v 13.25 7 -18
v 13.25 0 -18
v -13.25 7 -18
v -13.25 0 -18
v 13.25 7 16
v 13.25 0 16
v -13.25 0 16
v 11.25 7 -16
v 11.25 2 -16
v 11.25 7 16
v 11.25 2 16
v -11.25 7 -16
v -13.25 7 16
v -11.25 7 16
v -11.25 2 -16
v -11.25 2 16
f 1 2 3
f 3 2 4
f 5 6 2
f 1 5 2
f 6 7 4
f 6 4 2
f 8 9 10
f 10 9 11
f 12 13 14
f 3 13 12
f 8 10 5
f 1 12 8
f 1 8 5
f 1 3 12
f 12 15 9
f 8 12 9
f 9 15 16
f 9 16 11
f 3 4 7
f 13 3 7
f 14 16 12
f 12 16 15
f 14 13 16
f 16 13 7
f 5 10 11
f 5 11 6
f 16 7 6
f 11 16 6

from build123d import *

# Parameters (mm, degrees)
SKETCH1_W           = 22.5
SKETCH1_H           = 32
BOSS_EXTRUDE1_DEPTH = 2
BOSS_EXTRUDE3_START = -2
BOSS_EXTRUDE3_DEPTH = 7


with BuildPart() as part:
    # Sketch1 → Boss-Extrude1 (new body)
    with BuildSketch(Plane(origin=(0, 0, 0), x_dir=(1, 0, 0), z_dir=(0, 1, 0))):
        Rectangle(SKETCH1_W, SKETCH1_H)
    extrude(amount=BOSS_EXTRUDE1_DEPTH)

    # Sketch3 → Boss-Extrude3 (add)
    with BuildSketch(Plane(origin=(0, 2, 0), x_dir=(1, 0, 0), z_dir=(0, 1, 0)).offset(BOSS_EXTRUDE3_START)):
        Polygon((-11.25, -16), (-11.25, 16), (11.25, 16), (11.25, -16), (13.25, -16), (13.25, 18), (-13.25, 18), (-13.25, -16), align=None)
    extrude(amount=BOSS_EXTRUDE3_DEPTH)


solid = part.part
